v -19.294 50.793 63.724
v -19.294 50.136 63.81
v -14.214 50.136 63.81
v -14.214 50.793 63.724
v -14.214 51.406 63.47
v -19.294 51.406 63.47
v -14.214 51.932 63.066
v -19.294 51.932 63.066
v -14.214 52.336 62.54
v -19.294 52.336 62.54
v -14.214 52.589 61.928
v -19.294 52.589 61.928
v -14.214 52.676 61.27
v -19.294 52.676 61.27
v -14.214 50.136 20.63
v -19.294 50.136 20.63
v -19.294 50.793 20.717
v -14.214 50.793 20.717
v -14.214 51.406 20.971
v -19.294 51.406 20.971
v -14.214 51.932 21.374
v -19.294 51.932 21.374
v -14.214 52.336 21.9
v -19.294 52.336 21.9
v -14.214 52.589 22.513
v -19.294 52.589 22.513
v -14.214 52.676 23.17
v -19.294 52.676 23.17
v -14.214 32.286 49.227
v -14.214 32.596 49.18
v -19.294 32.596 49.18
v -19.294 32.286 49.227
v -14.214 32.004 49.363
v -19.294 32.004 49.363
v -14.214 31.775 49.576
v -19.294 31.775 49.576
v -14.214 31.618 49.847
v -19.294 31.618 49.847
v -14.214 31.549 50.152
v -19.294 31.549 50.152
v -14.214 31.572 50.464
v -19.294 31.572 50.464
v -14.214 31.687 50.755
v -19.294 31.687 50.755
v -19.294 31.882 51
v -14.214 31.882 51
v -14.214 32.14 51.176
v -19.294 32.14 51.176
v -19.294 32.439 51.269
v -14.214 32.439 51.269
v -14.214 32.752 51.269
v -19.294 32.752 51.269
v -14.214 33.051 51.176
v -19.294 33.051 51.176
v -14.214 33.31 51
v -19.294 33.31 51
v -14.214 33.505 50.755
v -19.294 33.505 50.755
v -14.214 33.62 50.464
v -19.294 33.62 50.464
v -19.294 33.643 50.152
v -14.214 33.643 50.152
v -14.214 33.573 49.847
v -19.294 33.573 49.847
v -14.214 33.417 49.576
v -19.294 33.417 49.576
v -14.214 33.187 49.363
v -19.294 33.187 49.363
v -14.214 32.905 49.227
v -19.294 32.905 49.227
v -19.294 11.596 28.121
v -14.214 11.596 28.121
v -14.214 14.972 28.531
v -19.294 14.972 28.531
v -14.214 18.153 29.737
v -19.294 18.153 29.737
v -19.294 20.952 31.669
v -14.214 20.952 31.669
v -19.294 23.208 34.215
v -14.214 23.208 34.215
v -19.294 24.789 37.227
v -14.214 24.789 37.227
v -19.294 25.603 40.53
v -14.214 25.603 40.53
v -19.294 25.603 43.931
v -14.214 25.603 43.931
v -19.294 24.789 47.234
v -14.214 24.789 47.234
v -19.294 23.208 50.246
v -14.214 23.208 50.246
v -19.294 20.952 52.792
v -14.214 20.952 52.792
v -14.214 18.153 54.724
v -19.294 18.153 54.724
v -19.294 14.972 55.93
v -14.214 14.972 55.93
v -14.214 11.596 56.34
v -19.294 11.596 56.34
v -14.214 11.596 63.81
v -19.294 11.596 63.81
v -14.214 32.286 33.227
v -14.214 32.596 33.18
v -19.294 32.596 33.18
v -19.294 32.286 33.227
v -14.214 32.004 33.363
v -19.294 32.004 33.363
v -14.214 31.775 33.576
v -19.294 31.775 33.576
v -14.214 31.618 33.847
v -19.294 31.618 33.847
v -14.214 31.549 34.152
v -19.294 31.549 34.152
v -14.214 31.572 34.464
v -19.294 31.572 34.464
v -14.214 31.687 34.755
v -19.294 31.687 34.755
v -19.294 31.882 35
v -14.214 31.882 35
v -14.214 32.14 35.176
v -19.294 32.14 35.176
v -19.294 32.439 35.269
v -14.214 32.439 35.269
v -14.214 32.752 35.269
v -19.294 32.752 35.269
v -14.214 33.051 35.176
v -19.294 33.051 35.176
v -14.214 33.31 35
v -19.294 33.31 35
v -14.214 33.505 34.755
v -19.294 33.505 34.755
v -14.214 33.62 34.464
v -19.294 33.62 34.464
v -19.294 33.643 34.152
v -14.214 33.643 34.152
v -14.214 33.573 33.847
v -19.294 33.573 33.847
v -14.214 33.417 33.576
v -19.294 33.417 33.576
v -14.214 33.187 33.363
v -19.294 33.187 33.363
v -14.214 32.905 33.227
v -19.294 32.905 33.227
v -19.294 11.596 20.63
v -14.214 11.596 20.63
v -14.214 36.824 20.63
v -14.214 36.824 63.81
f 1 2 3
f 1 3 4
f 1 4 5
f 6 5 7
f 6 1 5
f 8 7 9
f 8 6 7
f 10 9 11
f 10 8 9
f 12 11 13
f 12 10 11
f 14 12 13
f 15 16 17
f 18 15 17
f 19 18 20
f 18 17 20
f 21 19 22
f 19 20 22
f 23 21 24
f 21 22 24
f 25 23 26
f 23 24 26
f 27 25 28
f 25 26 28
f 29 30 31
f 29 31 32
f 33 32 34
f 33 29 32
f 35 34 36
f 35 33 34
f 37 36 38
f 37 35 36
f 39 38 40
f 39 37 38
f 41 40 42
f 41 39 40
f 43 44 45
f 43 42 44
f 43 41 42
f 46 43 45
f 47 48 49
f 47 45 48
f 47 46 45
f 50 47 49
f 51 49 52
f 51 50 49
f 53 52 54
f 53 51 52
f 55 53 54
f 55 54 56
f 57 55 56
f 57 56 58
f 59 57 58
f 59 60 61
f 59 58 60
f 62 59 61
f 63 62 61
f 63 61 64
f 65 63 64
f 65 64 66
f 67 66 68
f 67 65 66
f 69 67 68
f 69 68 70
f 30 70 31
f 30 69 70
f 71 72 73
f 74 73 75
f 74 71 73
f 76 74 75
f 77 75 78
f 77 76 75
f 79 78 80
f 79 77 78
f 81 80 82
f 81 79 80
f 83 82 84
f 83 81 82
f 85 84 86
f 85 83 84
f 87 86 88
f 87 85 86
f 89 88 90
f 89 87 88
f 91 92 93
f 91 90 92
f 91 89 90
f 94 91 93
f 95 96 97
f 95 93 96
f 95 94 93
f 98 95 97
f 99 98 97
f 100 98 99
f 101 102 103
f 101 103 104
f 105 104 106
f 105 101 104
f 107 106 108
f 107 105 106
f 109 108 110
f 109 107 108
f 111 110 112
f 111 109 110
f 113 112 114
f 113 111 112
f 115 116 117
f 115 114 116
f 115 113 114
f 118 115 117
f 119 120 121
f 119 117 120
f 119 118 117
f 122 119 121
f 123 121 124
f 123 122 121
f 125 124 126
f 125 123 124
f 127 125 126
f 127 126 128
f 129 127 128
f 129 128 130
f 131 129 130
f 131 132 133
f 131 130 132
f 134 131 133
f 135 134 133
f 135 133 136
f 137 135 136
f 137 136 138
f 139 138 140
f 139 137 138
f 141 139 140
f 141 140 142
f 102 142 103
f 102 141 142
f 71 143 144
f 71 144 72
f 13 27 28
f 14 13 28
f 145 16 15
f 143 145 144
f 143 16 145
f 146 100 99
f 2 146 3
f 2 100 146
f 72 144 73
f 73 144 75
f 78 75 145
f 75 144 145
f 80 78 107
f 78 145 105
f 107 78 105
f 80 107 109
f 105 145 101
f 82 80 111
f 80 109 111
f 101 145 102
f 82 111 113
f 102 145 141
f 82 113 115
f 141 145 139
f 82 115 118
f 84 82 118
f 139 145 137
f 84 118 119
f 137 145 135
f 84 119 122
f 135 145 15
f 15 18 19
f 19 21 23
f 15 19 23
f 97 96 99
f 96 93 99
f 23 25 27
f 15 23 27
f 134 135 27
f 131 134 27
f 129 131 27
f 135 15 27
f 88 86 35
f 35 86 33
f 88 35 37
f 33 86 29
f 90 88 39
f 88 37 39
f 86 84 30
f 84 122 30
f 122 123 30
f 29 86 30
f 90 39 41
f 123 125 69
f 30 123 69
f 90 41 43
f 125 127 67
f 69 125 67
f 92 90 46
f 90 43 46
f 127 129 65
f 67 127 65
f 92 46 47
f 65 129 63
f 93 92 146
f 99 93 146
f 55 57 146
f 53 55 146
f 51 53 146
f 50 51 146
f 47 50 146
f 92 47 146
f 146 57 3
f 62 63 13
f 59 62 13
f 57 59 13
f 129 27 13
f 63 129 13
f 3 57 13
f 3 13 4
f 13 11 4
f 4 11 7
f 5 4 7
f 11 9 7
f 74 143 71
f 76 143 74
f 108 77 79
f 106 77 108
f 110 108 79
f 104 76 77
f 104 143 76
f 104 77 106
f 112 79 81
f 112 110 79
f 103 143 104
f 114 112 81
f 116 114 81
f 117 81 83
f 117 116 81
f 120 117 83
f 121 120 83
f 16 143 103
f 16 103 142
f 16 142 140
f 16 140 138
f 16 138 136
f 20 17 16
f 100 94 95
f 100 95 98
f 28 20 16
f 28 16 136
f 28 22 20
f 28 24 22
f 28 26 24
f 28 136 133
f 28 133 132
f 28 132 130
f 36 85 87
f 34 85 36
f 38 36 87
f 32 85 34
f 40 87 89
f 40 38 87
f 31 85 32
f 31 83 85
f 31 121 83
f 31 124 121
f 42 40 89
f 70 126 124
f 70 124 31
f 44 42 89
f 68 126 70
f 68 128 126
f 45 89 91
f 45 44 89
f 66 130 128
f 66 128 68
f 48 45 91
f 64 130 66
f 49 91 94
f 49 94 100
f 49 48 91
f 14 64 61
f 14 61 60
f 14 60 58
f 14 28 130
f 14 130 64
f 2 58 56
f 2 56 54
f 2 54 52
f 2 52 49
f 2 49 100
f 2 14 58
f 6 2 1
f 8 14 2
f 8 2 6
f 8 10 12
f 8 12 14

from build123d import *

# Parameters (mm, degrees)
BOSS_EXTRUDE1_START     = 5.08
BOSS_EXTRUDE1_DEPTH     = 43.18
SKETCH2_W               = 51
SKETCH2_H               = 8.231998532
BOSS_EXTRUDE2_DEPTH     = 5.08
CUT_EXTRUDE1_DEPTH      = 100.957396182
CUT_EXTRUDE1_DEPTH_BACK = 5.08
SKETCH3_R               = 1.05
SKETCH4_R               = 1.25
CUT_EXTRUDE2_DEPTH      = 5.08
SKETCH5_W               = 51
SKETCH5_H               = 8.231998532
BOSS_EXTRUDE3_DEPTH     = 5.08
BOSS_EXTRUDE4_DEPTH     = 5.08
FILLET1_R               = 2.54
SKETCH7_W               = 75.202673557
SKETCH7_H               = 41.660019182
CUT_EXTRUDE3_DEPTH      = 80.950255842


with BuildPart() as part:
    # Sketch1 → Boss-Extrude1 (new body)
    with BuildSketch(Plane.XY.offset(58.730428606).offset(BOSS_EXTRUDE1_START)):
        Polygon((-14.213699035, 28.595837466), (-14.213699035, 47.595837466), (36.786300965, 47.595837466), (36.786300965, 28.595837466), (41.866300965, 28.595837466), (41.866300965, 52.675837466), (-19.293699035, 52.675837466), (-19.293699035, 28.595837466), align=None)
    extrude(amount=-BOSS_EXTRUDE1_DEPTH)

    # Sketch2 → Boss-Extrude2 (add)
    with BuildSketch(Plane(origin=(0, 0, 20.630428606), x_dir=(-1, 0, 0), z_dir=(0, 0, -1))):
        with Locations((-11.286300965, 43.4798382)):
            Rectangle(SKETCH2_W, SKETCH2_H)
    extrude(amount=-BOSS_EXTRUDE2_DEPTH)

    # Sketch3 → Cut-Extrude1 (cut, two sides: drawn at the far end of the back side and taken through both)
    with BuildSketch(Plane.ZY.offset(-36.786300965).offset(-CUT_EXTRUDE1_DEPTH_BACK)):
        with Locations(Location((50.230428606, 32.595837466, 0), (0, 0, 180))):
            Circle(SKETCH3_R)
        with Locations(Location((34.230428606, 32.595837466, 0), (0, 0, 180))):
            Circle(SKETCH3_R)
    extrude(amount=CUT_EXTRUDE1_DEPTH + CUT_EXTRUDE1_DEPTH_BACK, mode=Mode.SUBTRACT)

    # Sketch4 → Cut-Extrude2 (cut)
    with BuildSketch(Plane(origin=(0, 47.595837466, 0), x_dir=(-1, 0, 0), z_dir=(0, -1, 0))):
        with Locations(Location((-22.286300965, -42.230428606, 0), (0, 0, 90))):
            Circle(SKETCH4_R)
        with Locations(Location((-11.286300965, -53.230428606, 0), (0, 0, 90))):
            Circle(SKETCH4_R)
        with Locations(Location((-11.286300965, -31.230428606, 0), (0, 0, 90))):
            Circle(SKETCH4_R)
        with Locations(Location((-0.286300965, -42.230428606, 0), (0, 0, 90))):
            Circle(SKETCH4_R)
    extrude(amount=-CUT_EXTRUDE2_DEPTH, mode=Mode.SUBTRACT)

    # Sketch5 → Boss-Extrude3 (add)
    with BuildSketch(Plane.XY.offset(63.810428606)):
        with Locations((11.286300965, 43.4798382)):
            Rectangle(SKETCH5_W, SKETCH5_H)
    extrude(amount=-BOSS_EXTRUDE3_DEPTH)

    # Sketch6 → Boss-Extrude4 (add)
    with BuildSketch(Plane.ZY.offset(19.293699035)):
        with BuildLine():
            Line((63.810428606, 28.595837466), (20.630428606, 28.595837466))
            Line((20.630428606, 28.595837466), (20.630428606, 11.595837466))
            Line((20.630428606, 11.595837466), (28.120807374, 11.595837466))
            ThreePointArc((28.120807374, 11.595837466), (42.230428606, 25.705458697), (56.340049838, 11.595837466))
            Line((56.340049838, 11.595837466), (63.810428606, 11.595837466))
            Line((63.810428606, 11.595837466), (63.810428606, 28.595837466))
        make_face()
    extrude(amount=-BOSS_EXTRUDE4_DEPTH)

    # Fillet1
    fillet1_edges = [part.edges().sort_by_distance(p)[0] for p in [
        (41.866300965, 52.675837466, 42.220428606),
        (39.326300965, 28.595837466, 20.630428606),
        (11.286300965, 52.675837466, 20.630428606),
        (-14.213699035, 39.363838934, 23.170428606),
        (-14.213699035, 39.363838934, 61.270428606),
        (11.286300965, 52.675837466, 63.810428606),
        (39.326300965, 28.595837466, 63.810428606),
    ]]
    fillet(fillet1_edges, radius=FILLET1_R)

    # Sketch7 → Cut-Extrude3 (cut, through all)
    with BuildSketch(Plane.XY.offset(63.810428606)):
        with Locations((23.387637744, 39.269623894)):
            Rectangle(SKETCH7_W, SKETCH7_H)
    extrude(amount=-CUT_EXTRUDE3_DEPTH, mode=Mode.SUBTRACT)


solid = part.part
